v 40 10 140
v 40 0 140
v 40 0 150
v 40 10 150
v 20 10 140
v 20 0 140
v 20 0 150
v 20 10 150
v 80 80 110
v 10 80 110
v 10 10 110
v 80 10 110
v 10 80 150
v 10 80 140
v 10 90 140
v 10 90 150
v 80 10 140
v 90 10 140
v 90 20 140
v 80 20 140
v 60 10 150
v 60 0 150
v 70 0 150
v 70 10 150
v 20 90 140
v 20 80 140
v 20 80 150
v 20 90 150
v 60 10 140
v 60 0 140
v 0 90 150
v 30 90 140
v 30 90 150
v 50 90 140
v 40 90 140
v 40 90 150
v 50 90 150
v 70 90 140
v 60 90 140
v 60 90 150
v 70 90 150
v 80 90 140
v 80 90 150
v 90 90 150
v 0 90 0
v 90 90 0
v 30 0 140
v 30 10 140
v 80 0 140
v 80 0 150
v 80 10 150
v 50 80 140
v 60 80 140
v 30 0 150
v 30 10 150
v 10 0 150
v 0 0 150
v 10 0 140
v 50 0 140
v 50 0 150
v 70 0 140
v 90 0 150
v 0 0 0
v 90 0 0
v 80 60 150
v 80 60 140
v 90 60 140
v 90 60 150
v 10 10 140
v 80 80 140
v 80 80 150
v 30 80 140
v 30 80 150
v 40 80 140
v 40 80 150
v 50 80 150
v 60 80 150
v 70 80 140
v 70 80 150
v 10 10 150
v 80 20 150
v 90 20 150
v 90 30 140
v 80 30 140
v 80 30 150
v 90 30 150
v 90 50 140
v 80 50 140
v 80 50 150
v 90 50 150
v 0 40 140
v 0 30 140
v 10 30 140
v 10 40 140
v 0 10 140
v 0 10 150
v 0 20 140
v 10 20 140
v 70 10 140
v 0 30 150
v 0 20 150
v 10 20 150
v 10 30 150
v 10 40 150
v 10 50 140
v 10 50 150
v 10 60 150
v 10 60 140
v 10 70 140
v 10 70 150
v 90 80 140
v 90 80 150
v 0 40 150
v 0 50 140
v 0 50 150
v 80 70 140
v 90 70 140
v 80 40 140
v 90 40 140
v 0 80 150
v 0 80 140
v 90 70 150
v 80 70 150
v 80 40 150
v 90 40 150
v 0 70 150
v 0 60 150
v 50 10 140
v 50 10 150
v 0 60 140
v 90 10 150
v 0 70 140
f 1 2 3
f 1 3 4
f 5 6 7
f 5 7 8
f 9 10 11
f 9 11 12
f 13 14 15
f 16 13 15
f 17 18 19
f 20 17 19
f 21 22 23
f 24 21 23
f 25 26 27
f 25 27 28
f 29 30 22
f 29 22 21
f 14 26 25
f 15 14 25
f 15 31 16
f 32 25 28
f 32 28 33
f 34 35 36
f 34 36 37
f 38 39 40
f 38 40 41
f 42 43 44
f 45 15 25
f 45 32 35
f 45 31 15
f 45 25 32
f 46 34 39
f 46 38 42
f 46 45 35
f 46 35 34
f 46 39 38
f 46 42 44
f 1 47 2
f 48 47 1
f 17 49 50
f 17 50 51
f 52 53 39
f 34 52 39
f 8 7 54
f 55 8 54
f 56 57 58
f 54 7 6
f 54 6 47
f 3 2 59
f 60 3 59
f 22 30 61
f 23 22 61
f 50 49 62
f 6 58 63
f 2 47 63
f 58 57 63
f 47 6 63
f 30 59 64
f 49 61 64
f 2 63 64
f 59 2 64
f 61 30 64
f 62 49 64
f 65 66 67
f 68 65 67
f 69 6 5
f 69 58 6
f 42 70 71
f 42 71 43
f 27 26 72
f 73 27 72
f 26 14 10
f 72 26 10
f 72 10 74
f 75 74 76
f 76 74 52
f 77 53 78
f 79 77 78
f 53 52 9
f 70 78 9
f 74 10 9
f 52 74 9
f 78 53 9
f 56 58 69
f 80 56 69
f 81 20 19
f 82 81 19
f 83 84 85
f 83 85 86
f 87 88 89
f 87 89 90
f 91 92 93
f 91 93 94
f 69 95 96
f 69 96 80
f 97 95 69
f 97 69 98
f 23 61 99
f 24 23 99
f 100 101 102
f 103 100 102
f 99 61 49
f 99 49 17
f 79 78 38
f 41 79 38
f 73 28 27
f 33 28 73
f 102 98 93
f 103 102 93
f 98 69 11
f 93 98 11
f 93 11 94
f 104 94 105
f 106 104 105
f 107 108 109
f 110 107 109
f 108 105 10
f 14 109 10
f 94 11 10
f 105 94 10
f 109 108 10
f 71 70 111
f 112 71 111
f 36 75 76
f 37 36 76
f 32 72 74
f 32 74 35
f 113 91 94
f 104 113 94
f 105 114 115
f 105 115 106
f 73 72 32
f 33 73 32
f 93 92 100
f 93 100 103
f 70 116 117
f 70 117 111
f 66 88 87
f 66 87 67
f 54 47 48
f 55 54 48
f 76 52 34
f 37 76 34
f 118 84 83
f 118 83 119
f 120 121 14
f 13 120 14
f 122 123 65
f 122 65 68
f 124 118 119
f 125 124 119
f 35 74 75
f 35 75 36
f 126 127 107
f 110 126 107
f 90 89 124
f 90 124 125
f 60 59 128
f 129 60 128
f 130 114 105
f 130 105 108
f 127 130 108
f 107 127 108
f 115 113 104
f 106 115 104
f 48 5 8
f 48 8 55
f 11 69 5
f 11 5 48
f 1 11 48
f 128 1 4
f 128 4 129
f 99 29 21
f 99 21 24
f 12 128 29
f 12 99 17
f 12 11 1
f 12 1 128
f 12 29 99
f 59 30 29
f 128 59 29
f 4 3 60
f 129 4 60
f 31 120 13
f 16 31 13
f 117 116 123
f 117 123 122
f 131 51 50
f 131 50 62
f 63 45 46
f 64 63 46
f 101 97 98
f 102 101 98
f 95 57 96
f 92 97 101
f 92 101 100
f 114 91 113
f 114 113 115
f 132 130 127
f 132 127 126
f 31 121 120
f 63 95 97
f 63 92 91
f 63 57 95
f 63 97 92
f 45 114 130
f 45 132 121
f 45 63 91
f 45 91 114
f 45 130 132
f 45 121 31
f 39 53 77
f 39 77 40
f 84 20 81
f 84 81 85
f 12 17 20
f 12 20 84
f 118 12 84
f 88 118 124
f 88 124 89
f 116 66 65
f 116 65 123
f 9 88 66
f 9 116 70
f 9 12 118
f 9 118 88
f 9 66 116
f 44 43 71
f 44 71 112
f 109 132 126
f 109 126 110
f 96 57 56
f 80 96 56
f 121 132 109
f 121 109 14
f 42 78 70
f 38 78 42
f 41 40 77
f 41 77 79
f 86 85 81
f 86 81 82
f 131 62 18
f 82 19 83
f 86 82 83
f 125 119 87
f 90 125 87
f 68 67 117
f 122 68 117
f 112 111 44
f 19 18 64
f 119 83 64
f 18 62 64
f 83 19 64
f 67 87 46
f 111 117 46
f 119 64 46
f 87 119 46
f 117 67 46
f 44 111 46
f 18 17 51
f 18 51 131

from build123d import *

# Parameters (mm, degrees)
BOX004_W                 = 110
BOX004_H                 = 10
BOX004_DEPTH             = 10
ARRAY001_Y_COUNT         = 4
ARRAY001_Y_PITCH         = 20
ARRAY001_PLACEMENT_ANGLE = 90
BOX003_W                 = 110
BOX003_H                 = 10
BOX003_DEPTH             = 10
ARRAY_Y_COUNT            = 4
ARRAY_Y_PITCH            = 20
BOX002_W                 = 70
BOX002_H                 = 70
BOX002_DEPTH             = 110
BOX_W                    = 90
BOX_H                    = 90
BOX_DEPTH                = 150


with BuildPart() as barras_vert:
    # Box004 → Box004 (new body)
    with BuildSketch(Plane.XY):
        with Locations((55, 5)):
            Rectangle(BOX004_W, BOX004_H)
    extrude(amount=BOX004_DEPTH)

    # Array001 Y: Barras_vert ×4


with BuildPart() as barras_vert_1:
    add(barras_vert.part)
    with Locations(*[(0, i * ARRAY001_Y_PITCH, 0) for i in range(1, ARRAY001_Y_COUNT)]):
        add(barras_vert.part)


with BuildPart() as barras_vert_2:
    # Array001 placement: moved
    add(barras_vert_1.part.moved(Location((80, -10, 140))).rotate(Axis((80, -10, 140), (0, 0, 1)), ARRAY001_PLACEMENT_ANGLE))


with BuildPart() as barres:
    # Box003 → Box003 (new body)
    with BuildSketch(Plane.XY):
        with Locations((55, 5)):
            Rectangle(BOX003_W, BOX003_H)
    extrude(amount=BOX003_DEPTH)

    # Array Y: Barres ×4


with BuildPart() as barres_1:
    add(barres.part)
    with Locations(*[(0, i * ARRAY_Y_PITCH, 0) for i in range(1, ARRAY_Y_COUNT)]):
        add(barres.part)


with BuildPart() as barres_2:
    # Array placement: moved
    add(barres_1.part.moved(Location((-10, 10, 140))))

    # Fusion: union Barras_vert
    add(barras_vert_2.part)


with BuildPart() as cub002:
    # Box002 → Box002 (new body)
    with BuildSketch(Plane(origin=(10, 10, 110), x_dir=(1, 0, 0), z_dir=(0, 0, 1))):
        with Locations((35, 35)):
            Rectangle(BOX002_W, BOX002_H)
    extrude(amount=BOX002_DEPTH)


with BuildPart() as castell:
    # Box → Box (new body)
    with BuildSketch(Plane.XY):
        with Locations((45, 45)):
            Rectangle(BOX_W, BOX_H)
    extrude(amount=BOX_DEPTH)

    # Cut: cut Cub002
    add(cub002.part, mode=Mode.SUBTRACT)

    # Cut001: cut Barres
    add(barres_2.part, mode=Mode.SUBTRACT)


solid = castell.part
